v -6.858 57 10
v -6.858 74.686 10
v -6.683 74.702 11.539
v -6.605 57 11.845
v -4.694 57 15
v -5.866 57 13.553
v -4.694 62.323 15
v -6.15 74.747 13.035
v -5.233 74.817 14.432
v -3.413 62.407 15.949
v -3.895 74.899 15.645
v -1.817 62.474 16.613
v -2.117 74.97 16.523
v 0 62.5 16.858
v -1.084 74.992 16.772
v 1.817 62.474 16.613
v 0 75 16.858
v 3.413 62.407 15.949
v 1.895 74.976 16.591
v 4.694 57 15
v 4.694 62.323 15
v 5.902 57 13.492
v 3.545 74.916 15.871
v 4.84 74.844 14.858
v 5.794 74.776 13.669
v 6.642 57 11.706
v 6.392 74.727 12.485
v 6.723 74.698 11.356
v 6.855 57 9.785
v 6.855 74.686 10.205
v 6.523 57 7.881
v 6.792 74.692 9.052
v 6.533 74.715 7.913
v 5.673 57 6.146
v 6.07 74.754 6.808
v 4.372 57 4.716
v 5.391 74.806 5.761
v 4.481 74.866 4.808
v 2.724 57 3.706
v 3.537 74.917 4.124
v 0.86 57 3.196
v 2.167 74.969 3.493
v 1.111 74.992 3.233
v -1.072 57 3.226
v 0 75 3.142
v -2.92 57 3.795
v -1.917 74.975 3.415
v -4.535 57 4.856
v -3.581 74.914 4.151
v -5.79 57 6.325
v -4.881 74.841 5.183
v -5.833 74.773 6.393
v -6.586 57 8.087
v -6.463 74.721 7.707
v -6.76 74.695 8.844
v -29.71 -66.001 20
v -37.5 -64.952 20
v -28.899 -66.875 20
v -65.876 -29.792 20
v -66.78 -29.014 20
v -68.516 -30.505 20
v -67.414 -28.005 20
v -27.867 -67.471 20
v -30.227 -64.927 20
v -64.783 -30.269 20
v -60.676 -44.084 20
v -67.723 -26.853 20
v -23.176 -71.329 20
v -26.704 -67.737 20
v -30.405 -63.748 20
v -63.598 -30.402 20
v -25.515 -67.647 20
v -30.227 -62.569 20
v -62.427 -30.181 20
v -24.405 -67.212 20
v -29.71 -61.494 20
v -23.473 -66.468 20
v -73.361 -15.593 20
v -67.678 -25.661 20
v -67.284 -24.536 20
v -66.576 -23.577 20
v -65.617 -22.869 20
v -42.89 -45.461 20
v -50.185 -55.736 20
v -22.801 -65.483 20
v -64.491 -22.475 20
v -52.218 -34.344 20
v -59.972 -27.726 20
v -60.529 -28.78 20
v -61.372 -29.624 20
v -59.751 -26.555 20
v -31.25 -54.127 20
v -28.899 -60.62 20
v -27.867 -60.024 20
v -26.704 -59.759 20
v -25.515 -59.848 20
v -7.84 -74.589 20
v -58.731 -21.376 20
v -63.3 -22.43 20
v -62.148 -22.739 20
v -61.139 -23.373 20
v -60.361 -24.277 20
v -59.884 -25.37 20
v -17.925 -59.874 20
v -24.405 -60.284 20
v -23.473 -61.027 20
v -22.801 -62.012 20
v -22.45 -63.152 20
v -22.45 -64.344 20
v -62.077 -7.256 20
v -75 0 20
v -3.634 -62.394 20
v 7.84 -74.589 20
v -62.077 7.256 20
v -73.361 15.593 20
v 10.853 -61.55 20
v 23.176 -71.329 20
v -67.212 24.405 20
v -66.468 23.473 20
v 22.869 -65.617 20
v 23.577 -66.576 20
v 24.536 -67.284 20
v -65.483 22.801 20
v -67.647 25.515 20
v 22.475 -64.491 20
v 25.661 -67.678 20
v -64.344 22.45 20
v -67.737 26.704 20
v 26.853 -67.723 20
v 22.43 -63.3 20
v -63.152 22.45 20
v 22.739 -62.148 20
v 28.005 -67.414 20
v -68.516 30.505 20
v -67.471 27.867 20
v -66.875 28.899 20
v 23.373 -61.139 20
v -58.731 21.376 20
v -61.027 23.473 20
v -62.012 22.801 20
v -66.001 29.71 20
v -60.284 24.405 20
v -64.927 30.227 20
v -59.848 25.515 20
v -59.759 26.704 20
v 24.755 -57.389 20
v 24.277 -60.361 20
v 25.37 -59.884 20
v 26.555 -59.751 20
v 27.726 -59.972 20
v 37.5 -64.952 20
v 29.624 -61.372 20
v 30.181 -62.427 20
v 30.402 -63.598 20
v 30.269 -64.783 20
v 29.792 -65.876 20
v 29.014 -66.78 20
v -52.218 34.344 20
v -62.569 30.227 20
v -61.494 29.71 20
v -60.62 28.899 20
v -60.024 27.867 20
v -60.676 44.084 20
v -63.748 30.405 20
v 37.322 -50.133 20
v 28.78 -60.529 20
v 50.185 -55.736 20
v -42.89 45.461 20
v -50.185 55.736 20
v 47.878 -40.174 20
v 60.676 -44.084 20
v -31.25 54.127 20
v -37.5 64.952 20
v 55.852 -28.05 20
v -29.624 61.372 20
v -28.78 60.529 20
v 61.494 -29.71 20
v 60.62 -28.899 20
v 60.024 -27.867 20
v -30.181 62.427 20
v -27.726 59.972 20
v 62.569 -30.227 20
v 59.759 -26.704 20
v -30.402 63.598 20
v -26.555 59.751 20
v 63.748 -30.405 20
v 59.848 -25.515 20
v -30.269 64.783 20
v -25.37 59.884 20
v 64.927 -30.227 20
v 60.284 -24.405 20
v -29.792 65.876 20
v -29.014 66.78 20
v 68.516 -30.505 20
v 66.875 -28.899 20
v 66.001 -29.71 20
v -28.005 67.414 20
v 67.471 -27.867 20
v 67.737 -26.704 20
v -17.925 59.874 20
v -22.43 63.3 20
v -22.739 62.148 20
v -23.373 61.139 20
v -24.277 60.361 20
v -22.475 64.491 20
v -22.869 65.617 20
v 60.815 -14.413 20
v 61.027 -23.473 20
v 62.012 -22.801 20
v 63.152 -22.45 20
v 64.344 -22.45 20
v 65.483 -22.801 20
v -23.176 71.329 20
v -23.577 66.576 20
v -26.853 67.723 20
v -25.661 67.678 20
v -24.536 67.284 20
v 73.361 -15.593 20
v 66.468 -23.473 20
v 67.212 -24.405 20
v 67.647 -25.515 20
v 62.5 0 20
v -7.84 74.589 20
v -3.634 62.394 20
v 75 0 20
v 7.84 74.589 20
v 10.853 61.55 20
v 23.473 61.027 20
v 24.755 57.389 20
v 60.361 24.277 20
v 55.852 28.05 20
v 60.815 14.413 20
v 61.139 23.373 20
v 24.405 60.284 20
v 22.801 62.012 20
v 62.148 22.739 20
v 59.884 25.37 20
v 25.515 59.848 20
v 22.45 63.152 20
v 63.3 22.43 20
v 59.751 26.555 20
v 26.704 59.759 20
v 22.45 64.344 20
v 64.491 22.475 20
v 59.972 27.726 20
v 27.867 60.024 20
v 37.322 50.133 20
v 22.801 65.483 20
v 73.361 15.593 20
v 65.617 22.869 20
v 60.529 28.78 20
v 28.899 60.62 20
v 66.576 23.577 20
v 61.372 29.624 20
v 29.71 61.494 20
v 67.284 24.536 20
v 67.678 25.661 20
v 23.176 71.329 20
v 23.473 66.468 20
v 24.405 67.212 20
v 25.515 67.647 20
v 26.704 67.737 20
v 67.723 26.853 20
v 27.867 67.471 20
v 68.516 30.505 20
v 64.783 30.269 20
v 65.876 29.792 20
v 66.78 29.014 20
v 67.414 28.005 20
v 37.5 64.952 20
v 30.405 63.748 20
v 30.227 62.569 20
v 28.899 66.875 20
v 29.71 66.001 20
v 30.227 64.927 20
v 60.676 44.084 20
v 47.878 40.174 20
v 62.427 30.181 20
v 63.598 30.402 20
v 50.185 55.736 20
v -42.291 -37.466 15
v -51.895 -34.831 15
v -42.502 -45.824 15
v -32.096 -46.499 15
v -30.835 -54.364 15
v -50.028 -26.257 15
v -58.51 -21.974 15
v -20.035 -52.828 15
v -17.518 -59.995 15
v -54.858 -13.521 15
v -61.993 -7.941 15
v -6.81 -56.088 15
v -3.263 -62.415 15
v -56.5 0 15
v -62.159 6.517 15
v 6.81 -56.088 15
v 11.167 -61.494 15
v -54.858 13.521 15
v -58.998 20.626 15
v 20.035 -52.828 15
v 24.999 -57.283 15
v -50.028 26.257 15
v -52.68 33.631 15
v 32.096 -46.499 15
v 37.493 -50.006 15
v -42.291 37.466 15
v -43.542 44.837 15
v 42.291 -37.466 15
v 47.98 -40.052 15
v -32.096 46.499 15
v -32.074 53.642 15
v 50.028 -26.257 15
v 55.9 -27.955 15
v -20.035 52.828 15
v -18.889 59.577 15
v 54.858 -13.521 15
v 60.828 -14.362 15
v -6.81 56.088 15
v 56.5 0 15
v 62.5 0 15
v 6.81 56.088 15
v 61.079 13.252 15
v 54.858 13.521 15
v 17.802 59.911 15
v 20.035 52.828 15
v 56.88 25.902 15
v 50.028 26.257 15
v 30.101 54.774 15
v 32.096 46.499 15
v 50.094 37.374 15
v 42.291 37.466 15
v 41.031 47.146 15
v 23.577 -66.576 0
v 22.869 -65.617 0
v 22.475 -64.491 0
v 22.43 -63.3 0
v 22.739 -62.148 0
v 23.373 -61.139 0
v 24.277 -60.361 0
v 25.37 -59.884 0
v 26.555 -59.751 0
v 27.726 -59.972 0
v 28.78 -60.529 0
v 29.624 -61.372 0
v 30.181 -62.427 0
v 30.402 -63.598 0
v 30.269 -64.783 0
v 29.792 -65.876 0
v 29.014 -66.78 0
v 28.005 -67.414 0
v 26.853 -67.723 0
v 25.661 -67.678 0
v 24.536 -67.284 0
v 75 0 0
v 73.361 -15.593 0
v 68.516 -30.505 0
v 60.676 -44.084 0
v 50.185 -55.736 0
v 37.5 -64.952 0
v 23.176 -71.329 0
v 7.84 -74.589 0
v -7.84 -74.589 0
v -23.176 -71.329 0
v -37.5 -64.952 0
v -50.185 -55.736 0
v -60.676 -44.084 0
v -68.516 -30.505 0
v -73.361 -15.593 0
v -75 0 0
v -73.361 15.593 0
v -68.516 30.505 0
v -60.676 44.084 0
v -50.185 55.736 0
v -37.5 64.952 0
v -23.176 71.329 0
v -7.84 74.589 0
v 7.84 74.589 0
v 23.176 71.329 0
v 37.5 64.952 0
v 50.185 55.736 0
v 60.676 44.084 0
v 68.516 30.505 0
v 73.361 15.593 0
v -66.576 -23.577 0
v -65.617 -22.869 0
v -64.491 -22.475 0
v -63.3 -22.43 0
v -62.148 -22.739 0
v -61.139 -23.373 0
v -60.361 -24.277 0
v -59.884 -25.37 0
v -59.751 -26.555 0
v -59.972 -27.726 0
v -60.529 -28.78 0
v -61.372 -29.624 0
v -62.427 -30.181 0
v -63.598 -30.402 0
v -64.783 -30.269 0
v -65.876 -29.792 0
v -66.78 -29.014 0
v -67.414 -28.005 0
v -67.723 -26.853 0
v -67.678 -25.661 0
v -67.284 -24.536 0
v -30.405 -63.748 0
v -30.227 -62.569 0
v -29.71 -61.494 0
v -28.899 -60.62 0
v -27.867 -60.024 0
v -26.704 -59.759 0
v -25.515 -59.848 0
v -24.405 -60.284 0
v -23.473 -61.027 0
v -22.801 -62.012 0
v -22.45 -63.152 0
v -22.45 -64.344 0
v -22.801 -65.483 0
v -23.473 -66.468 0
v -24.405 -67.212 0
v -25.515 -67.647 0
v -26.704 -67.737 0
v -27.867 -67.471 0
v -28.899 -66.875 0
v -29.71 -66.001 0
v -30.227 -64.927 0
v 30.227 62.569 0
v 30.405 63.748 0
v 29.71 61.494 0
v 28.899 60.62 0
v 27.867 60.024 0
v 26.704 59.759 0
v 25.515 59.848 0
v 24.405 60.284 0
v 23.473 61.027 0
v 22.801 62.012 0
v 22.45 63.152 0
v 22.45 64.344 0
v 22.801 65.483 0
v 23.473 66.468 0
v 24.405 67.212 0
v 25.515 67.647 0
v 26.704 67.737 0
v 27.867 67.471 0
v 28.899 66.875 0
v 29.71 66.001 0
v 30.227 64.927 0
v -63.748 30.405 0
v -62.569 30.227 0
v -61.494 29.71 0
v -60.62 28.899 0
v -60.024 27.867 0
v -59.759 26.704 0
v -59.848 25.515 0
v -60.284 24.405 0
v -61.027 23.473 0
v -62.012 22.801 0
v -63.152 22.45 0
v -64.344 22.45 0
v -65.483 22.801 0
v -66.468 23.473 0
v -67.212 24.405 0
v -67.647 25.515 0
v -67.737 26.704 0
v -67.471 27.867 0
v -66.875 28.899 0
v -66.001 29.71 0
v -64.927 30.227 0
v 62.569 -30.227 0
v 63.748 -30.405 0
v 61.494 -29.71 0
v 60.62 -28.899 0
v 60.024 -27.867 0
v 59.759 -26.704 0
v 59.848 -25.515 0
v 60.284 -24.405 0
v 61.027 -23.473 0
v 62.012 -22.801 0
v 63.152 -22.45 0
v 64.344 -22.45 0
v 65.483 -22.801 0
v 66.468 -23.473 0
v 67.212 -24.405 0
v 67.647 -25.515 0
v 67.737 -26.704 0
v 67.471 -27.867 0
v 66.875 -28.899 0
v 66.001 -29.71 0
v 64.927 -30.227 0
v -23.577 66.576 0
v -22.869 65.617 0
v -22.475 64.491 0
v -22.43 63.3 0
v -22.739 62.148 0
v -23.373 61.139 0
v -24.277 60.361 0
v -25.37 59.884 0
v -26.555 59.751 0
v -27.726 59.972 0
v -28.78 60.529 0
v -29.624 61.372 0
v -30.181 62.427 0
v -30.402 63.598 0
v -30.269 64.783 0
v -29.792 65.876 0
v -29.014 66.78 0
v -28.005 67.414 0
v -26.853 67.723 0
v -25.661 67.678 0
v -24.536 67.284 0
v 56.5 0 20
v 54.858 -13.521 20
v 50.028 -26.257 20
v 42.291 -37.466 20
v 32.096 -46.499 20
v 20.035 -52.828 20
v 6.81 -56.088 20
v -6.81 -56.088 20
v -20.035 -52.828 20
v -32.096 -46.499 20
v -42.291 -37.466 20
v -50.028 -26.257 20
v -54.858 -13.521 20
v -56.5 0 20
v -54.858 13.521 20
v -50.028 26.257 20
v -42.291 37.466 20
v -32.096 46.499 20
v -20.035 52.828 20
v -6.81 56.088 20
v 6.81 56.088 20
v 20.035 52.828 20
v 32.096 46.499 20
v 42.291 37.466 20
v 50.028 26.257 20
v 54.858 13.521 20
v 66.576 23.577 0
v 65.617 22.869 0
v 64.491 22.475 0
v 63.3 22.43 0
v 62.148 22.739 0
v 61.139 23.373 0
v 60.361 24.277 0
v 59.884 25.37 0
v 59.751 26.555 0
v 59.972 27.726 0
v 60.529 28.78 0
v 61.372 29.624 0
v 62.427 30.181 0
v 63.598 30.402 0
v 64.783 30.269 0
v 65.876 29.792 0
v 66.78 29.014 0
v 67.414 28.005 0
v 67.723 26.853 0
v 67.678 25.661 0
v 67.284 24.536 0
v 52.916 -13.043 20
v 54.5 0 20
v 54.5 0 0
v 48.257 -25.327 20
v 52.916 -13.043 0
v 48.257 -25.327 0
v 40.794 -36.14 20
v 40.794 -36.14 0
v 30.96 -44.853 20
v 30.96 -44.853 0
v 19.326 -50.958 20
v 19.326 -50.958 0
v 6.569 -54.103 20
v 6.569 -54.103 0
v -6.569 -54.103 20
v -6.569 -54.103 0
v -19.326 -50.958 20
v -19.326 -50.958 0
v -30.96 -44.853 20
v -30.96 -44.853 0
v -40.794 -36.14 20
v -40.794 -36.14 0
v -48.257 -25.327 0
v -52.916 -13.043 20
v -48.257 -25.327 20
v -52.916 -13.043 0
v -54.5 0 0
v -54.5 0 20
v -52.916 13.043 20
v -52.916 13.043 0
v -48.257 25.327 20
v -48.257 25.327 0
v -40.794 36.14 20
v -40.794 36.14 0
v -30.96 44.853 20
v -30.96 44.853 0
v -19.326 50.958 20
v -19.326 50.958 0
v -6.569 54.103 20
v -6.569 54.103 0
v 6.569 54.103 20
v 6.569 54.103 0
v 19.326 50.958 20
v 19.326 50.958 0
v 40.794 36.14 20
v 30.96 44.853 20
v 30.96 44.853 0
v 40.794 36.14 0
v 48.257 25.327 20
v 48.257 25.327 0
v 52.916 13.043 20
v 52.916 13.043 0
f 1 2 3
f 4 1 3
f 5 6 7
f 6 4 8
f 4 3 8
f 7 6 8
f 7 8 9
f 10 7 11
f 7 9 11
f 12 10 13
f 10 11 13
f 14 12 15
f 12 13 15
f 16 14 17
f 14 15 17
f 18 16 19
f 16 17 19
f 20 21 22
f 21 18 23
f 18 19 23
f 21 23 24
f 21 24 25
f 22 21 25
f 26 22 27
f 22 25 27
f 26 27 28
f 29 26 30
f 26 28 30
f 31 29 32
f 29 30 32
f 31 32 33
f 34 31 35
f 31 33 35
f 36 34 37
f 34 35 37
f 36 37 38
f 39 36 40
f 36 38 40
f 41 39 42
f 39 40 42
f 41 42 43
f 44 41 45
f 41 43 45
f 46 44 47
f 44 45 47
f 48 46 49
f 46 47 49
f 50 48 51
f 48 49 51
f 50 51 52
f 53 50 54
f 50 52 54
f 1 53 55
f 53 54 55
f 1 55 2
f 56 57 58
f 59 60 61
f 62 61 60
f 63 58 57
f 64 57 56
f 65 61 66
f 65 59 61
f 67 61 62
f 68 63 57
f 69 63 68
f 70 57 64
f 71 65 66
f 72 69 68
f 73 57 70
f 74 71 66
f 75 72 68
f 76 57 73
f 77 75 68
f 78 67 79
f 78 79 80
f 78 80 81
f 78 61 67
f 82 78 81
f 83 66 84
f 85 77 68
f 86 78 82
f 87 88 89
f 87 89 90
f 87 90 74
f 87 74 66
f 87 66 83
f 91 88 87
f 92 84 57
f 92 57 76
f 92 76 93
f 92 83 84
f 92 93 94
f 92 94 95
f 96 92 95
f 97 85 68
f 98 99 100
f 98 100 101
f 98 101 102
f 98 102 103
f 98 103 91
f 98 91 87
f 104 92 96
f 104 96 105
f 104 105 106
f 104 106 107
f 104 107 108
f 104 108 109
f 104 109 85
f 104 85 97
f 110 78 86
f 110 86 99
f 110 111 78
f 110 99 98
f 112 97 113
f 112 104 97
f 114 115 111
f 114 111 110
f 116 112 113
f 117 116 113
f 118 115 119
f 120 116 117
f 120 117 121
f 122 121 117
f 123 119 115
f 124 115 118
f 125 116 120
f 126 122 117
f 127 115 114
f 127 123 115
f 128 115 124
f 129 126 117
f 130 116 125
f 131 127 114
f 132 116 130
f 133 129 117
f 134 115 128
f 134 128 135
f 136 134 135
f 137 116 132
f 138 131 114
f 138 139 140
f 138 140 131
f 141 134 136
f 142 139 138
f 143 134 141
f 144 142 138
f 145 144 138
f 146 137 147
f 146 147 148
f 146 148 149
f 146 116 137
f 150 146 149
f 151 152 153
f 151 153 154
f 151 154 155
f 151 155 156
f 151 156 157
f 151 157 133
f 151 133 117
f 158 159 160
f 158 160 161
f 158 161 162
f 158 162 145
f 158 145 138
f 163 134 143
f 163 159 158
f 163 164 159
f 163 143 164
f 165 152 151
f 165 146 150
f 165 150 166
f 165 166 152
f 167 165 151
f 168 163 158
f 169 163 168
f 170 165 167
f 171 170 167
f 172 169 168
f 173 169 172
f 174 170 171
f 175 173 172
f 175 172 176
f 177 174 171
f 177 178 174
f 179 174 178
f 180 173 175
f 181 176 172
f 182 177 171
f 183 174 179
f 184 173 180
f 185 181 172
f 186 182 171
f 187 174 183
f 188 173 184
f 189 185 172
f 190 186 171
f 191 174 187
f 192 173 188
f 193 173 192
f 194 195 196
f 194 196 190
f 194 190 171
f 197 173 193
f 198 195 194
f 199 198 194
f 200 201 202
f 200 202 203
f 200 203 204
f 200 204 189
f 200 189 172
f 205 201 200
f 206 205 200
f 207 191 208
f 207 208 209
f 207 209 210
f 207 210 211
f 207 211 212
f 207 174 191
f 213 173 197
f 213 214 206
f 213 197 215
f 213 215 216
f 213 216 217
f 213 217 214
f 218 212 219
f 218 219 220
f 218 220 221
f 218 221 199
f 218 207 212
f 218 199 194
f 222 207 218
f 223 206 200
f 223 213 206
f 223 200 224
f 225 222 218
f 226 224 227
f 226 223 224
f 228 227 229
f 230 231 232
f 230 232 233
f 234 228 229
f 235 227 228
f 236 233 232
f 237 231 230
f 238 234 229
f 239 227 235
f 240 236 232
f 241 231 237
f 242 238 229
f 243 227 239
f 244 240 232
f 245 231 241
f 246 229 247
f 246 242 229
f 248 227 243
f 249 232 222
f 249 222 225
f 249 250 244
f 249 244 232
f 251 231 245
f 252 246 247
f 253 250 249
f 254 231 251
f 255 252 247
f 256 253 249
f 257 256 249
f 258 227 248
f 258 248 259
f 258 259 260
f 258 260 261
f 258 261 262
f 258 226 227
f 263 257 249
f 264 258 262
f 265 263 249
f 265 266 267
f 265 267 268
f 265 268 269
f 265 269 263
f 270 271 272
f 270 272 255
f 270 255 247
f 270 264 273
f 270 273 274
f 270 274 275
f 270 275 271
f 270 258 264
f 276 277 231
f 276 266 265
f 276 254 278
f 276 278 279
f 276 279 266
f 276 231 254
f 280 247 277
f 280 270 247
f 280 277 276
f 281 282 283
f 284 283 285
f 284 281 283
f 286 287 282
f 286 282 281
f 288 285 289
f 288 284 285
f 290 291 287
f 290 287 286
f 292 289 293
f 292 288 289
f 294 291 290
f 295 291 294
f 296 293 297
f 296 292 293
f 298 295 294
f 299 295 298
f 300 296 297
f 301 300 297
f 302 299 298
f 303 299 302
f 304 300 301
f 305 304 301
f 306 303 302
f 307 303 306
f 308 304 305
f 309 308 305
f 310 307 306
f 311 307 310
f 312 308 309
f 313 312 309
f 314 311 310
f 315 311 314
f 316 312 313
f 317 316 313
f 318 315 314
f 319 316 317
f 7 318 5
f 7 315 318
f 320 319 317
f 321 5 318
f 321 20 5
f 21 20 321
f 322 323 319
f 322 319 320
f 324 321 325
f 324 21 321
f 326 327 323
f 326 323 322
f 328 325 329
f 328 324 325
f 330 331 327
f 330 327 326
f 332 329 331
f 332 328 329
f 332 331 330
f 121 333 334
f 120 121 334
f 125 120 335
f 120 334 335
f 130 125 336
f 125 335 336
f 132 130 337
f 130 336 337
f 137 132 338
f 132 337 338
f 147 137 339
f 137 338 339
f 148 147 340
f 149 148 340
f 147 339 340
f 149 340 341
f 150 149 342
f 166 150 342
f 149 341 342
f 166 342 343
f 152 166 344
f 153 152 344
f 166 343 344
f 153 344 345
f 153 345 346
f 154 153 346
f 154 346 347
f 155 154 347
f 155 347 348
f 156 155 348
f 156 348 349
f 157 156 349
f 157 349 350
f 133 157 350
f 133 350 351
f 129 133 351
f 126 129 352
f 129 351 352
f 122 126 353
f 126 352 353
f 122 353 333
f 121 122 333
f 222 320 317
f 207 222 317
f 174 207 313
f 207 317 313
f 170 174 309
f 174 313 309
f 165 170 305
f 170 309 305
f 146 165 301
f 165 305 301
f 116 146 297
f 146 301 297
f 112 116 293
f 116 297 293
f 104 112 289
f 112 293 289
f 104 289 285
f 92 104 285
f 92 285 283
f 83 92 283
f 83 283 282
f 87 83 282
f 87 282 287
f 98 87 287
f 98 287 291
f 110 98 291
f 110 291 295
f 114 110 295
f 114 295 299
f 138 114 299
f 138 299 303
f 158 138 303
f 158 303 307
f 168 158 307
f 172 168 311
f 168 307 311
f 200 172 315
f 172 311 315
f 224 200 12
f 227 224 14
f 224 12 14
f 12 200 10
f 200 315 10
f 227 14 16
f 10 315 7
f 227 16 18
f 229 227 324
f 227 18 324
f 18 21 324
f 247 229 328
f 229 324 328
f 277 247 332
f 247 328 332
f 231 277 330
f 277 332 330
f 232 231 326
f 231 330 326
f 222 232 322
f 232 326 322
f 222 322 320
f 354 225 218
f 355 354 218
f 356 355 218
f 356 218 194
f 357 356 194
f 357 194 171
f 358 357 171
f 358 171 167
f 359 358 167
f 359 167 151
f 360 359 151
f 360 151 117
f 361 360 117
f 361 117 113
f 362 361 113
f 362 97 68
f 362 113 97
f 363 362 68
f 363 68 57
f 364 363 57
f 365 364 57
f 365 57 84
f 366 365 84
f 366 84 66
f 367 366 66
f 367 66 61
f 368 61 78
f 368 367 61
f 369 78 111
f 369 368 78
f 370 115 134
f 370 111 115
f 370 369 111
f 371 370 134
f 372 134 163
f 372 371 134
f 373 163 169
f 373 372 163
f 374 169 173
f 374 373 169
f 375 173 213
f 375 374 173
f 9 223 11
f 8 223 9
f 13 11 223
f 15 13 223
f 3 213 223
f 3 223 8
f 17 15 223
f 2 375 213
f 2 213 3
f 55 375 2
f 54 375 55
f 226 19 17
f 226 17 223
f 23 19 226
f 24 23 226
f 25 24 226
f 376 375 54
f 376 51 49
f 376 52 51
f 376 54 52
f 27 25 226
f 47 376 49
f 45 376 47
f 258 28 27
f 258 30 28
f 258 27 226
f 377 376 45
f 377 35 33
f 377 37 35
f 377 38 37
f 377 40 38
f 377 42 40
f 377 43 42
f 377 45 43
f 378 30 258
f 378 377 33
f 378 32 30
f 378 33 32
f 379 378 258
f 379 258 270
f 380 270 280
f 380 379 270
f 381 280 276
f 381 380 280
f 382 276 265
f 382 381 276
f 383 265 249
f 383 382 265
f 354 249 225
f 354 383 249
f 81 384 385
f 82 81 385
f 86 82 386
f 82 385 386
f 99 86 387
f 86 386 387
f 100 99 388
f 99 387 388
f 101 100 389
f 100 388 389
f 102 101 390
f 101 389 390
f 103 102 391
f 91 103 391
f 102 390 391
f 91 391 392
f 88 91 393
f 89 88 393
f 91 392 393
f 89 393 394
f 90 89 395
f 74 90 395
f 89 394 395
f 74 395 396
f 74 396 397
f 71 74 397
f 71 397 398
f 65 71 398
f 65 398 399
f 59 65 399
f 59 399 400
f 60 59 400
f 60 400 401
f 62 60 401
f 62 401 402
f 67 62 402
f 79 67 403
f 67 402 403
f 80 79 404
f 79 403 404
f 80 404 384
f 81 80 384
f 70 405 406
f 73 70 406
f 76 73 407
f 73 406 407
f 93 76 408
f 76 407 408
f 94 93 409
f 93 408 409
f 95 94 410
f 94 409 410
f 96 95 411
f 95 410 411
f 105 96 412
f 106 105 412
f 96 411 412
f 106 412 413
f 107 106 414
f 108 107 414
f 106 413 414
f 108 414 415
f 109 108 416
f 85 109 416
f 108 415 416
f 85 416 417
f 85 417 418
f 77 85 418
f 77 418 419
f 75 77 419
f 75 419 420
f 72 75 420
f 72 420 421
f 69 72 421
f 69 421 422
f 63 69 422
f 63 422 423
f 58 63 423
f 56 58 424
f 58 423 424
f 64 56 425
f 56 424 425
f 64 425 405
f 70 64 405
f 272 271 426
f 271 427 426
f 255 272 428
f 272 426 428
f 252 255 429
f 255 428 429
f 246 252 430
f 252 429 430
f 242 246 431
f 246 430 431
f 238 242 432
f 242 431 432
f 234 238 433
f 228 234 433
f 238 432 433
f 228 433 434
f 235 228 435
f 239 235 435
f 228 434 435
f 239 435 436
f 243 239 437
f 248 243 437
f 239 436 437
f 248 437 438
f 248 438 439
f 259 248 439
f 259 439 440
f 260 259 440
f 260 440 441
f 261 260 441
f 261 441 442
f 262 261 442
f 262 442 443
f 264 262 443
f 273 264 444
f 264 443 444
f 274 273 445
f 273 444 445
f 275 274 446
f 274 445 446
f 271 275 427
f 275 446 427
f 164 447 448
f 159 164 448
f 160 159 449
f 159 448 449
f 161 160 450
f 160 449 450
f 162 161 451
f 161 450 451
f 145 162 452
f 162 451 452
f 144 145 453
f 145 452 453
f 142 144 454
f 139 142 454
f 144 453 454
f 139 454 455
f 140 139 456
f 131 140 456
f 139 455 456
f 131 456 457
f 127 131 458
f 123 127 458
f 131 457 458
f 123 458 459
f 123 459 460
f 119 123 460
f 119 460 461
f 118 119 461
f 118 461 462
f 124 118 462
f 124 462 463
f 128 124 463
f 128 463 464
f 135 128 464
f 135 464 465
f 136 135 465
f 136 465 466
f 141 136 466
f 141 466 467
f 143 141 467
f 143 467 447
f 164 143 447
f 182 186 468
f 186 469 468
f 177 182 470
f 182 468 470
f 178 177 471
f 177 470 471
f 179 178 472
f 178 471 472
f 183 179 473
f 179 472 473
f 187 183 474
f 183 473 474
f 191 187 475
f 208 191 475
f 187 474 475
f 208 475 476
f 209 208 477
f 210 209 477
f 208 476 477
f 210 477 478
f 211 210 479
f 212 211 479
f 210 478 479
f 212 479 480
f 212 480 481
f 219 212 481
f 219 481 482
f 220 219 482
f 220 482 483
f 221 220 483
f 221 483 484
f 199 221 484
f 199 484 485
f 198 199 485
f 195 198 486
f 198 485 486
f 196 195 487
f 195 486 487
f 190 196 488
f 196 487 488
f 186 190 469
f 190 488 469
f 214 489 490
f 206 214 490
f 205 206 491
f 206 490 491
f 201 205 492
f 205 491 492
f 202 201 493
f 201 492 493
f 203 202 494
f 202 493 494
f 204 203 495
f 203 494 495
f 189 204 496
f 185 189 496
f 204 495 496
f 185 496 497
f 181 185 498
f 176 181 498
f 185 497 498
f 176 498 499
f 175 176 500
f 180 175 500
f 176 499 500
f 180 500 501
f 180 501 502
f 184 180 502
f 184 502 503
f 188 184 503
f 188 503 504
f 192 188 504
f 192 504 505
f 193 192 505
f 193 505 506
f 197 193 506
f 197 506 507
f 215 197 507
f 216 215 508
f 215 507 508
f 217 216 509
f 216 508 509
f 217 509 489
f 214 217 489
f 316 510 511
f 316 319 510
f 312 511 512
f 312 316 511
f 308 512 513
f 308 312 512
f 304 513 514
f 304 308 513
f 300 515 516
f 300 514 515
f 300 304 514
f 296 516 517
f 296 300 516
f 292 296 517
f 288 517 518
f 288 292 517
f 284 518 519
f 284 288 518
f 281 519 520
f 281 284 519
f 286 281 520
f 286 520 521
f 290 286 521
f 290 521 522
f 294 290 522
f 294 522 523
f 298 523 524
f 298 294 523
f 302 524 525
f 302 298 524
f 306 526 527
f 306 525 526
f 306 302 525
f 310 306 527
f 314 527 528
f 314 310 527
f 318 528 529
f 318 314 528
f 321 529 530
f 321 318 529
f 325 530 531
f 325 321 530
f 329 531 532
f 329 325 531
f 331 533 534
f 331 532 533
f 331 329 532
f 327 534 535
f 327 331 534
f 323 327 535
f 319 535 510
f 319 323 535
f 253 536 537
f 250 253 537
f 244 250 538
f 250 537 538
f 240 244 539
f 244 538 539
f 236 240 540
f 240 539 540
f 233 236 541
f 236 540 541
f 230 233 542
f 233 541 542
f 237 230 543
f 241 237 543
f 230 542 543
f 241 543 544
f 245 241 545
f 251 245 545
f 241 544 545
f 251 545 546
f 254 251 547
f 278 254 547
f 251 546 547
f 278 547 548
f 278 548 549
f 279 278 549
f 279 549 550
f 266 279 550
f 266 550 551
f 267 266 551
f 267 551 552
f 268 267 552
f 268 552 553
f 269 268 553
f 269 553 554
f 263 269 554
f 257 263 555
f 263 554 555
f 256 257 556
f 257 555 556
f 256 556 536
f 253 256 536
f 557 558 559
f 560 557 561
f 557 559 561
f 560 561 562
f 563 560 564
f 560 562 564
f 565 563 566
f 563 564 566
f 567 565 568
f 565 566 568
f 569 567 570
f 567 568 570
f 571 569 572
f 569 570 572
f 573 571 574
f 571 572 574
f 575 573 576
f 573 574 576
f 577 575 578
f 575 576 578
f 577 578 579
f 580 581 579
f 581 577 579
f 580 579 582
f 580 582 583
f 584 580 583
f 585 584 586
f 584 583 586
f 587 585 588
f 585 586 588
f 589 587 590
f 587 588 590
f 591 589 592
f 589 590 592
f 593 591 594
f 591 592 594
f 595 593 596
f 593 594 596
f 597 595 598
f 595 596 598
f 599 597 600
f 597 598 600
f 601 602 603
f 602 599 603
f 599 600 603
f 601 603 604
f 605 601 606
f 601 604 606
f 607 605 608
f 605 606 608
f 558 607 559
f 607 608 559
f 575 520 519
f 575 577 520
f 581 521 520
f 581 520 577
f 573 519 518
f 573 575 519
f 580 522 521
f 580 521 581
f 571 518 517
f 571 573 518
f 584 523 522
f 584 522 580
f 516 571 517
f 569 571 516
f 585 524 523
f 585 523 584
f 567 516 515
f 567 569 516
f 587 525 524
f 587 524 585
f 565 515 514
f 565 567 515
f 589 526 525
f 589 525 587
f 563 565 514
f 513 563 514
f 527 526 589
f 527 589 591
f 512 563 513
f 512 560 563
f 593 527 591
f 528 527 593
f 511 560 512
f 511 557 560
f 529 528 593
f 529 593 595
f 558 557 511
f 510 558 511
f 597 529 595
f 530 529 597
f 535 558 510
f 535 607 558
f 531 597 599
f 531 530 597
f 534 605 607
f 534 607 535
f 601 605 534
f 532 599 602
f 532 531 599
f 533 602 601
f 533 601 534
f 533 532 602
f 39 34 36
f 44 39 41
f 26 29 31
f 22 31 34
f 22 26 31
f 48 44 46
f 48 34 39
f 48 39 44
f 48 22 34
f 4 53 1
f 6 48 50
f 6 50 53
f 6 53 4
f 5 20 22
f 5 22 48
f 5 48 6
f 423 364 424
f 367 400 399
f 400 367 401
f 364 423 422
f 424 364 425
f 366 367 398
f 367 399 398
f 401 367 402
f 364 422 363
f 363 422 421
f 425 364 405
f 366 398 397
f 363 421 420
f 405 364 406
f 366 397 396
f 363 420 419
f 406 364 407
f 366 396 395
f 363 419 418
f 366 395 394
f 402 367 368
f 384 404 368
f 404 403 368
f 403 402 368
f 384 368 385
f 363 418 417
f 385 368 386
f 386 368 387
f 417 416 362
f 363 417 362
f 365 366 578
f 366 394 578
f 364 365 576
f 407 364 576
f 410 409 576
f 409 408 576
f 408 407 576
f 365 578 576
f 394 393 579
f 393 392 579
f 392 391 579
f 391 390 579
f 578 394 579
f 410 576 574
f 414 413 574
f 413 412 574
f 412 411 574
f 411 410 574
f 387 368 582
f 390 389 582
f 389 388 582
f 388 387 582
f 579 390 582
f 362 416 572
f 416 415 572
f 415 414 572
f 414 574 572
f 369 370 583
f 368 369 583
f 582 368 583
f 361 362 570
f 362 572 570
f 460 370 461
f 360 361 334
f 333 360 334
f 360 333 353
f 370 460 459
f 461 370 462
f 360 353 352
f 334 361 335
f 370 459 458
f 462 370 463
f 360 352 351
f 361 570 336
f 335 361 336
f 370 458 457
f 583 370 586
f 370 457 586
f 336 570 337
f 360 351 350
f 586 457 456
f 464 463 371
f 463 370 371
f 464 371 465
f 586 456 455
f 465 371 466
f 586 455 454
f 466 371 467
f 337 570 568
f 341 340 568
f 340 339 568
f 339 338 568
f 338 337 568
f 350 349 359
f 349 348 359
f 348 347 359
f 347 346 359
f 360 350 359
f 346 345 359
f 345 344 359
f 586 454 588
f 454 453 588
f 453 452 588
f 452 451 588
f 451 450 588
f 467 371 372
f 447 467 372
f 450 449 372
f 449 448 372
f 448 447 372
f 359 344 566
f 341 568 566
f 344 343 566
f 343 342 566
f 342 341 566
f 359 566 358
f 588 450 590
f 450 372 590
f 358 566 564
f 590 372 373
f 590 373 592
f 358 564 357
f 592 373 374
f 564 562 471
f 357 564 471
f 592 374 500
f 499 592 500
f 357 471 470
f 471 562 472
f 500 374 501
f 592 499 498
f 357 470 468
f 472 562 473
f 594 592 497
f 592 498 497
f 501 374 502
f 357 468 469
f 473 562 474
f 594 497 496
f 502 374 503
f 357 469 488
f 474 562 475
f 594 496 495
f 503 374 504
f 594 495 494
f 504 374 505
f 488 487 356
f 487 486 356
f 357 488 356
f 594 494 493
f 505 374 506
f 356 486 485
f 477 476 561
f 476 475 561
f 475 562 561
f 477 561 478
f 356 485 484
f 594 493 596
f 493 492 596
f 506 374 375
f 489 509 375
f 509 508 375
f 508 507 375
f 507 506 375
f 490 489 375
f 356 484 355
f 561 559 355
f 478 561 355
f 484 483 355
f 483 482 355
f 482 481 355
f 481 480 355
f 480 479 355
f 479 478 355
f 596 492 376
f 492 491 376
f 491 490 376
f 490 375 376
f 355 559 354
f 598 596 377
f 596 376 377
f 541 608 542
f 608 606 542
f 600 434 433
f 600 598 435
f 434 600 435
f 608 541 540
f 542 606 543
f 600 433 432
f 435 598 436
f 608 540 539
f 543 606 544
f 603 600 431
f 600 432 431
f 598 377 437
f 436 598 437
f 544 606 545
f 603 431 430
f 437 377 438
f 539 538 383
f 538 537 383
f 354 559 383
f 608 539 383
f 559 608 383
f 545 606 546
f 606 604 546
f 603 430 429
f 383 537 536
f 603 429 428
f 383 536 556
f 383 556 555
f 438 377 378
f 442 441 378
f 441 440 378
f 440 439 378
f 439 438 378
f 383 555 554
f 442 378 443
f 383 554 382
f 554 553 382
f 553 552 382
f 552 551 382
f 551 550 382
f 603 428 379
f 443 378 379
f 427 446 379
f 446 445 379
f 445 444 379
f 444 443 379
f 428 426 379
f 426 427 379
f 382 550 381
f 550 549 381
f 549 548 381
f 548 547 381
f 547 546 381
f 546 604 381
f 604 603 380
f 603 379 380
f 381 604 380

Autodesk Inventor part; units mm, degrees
ref_plane "YZ Plane" through (0, 0, 0) normal (1, 0, 0) x (0, 1, 0)
ref_plane "XY Plane" through (0, 0, 0) normal (0, 0, 1) x (1, 0, 0)
sketch "Sketch1" plane through (0, 0, 0) normal (0, 0, 1) x (1, 0, 0)
  circle A0 centre (0, 0) radius 54.5
  circle A1 centre (0, 0) radius 75
  circle A2 centre (0, 0) radius 56.5
  circle A3 centre (0, 0) radius 62.5
  circle A4 centre (0, 0) radius 69
  line L0 (0, 0) -> (0, 69) construction
  line L1 (0, 0) -> (26.4052, 63.7477) construction
  line L2 (0, 0) -> (69, 0) construction
  circle A5 centre (26.4052, 63.7477) radius 4
  dimension "d0" = 109
  dimension "d1" = 150
  dimension "d2" = 113
  dimension "d3" = 125
  dimension "d4" = 138
  dimension "d16" = 67.5
  dimension "d17" = 8
extrude "Extrusion1" add sketch "Sketch1" along normal blind 20 contours A2
extrude "Extrusion2" add sketch "Sketch1" along normal blind 15 contours A3
extrude "Extrusion3" add sketch "Sketch1" along normal blind 20 contours A1 | A4 A5 | A5 A4 | A4 A5
ref_plane "Work Plane1" through (0, 75, 0) normal (0, 1, 0) x (-1, 0, 0)
sketch "Sketch2" plane through (0, 75, 0) normal (0, 1, 0) x (-1, 0, 0)
  line L0 (0, 0) -> (0, 10) construction
  circle A0 centre (0, 10) radius 6.858
  dimension "d12" = 10
  dimension "d13" = 13.716
extrude "Extrusion4" cut sketch "Sketch2" against normal blind 18
extrude "Extrusion5" cut sketch "Sketch1" along normal through all contours A5 A4 | A4 A5 picked at (25.7495, 62.5769) picked at (26.9375, 64.9608)
thread "Thread2" size "M8x1.25" class "6H" standard "ANSI Metric M Profile" full length
pattern_circular "Circular Pattern2" count 8 over 360 about axis through (0, 0, -10) along (0, 0, 1) of "Extrusion5"
thread "Thread13" size "M8x1.25" class "6H" standard "ANSI Metric M Profile" full length
thread "Thread14" size "M8x1.25" class "6H" standard "ANSI Metric M Profile" full length
thread "Thread15" size "M8x1.25" class "6H" standard "ANSI Metric M Profile" full length
thread "Thread16" size "M8x1.25" class "6H" standard "ANSI Metric M Profile" full length
thread "Thread17" size "M8x1.25" class "6H" standard "ANSI Metric M Profile" full length
thread "Thread18" size "M8x1.25" class "6H" standard "ANSI Metric M Profile" full length
thread "Thread19" size "M8x1.25" class "6H" standard "ANSI Metric M Profile" full length
thread "Thread20" size "M8x1.25" class "6H" standard "ANSI Metric M Profile" full length
thread "Thread21" size "9/16-12 UNC" class "2B" standard "ANSI Unified Screw Threads" full length
properties part number "front" material "Aluminum 6061"
